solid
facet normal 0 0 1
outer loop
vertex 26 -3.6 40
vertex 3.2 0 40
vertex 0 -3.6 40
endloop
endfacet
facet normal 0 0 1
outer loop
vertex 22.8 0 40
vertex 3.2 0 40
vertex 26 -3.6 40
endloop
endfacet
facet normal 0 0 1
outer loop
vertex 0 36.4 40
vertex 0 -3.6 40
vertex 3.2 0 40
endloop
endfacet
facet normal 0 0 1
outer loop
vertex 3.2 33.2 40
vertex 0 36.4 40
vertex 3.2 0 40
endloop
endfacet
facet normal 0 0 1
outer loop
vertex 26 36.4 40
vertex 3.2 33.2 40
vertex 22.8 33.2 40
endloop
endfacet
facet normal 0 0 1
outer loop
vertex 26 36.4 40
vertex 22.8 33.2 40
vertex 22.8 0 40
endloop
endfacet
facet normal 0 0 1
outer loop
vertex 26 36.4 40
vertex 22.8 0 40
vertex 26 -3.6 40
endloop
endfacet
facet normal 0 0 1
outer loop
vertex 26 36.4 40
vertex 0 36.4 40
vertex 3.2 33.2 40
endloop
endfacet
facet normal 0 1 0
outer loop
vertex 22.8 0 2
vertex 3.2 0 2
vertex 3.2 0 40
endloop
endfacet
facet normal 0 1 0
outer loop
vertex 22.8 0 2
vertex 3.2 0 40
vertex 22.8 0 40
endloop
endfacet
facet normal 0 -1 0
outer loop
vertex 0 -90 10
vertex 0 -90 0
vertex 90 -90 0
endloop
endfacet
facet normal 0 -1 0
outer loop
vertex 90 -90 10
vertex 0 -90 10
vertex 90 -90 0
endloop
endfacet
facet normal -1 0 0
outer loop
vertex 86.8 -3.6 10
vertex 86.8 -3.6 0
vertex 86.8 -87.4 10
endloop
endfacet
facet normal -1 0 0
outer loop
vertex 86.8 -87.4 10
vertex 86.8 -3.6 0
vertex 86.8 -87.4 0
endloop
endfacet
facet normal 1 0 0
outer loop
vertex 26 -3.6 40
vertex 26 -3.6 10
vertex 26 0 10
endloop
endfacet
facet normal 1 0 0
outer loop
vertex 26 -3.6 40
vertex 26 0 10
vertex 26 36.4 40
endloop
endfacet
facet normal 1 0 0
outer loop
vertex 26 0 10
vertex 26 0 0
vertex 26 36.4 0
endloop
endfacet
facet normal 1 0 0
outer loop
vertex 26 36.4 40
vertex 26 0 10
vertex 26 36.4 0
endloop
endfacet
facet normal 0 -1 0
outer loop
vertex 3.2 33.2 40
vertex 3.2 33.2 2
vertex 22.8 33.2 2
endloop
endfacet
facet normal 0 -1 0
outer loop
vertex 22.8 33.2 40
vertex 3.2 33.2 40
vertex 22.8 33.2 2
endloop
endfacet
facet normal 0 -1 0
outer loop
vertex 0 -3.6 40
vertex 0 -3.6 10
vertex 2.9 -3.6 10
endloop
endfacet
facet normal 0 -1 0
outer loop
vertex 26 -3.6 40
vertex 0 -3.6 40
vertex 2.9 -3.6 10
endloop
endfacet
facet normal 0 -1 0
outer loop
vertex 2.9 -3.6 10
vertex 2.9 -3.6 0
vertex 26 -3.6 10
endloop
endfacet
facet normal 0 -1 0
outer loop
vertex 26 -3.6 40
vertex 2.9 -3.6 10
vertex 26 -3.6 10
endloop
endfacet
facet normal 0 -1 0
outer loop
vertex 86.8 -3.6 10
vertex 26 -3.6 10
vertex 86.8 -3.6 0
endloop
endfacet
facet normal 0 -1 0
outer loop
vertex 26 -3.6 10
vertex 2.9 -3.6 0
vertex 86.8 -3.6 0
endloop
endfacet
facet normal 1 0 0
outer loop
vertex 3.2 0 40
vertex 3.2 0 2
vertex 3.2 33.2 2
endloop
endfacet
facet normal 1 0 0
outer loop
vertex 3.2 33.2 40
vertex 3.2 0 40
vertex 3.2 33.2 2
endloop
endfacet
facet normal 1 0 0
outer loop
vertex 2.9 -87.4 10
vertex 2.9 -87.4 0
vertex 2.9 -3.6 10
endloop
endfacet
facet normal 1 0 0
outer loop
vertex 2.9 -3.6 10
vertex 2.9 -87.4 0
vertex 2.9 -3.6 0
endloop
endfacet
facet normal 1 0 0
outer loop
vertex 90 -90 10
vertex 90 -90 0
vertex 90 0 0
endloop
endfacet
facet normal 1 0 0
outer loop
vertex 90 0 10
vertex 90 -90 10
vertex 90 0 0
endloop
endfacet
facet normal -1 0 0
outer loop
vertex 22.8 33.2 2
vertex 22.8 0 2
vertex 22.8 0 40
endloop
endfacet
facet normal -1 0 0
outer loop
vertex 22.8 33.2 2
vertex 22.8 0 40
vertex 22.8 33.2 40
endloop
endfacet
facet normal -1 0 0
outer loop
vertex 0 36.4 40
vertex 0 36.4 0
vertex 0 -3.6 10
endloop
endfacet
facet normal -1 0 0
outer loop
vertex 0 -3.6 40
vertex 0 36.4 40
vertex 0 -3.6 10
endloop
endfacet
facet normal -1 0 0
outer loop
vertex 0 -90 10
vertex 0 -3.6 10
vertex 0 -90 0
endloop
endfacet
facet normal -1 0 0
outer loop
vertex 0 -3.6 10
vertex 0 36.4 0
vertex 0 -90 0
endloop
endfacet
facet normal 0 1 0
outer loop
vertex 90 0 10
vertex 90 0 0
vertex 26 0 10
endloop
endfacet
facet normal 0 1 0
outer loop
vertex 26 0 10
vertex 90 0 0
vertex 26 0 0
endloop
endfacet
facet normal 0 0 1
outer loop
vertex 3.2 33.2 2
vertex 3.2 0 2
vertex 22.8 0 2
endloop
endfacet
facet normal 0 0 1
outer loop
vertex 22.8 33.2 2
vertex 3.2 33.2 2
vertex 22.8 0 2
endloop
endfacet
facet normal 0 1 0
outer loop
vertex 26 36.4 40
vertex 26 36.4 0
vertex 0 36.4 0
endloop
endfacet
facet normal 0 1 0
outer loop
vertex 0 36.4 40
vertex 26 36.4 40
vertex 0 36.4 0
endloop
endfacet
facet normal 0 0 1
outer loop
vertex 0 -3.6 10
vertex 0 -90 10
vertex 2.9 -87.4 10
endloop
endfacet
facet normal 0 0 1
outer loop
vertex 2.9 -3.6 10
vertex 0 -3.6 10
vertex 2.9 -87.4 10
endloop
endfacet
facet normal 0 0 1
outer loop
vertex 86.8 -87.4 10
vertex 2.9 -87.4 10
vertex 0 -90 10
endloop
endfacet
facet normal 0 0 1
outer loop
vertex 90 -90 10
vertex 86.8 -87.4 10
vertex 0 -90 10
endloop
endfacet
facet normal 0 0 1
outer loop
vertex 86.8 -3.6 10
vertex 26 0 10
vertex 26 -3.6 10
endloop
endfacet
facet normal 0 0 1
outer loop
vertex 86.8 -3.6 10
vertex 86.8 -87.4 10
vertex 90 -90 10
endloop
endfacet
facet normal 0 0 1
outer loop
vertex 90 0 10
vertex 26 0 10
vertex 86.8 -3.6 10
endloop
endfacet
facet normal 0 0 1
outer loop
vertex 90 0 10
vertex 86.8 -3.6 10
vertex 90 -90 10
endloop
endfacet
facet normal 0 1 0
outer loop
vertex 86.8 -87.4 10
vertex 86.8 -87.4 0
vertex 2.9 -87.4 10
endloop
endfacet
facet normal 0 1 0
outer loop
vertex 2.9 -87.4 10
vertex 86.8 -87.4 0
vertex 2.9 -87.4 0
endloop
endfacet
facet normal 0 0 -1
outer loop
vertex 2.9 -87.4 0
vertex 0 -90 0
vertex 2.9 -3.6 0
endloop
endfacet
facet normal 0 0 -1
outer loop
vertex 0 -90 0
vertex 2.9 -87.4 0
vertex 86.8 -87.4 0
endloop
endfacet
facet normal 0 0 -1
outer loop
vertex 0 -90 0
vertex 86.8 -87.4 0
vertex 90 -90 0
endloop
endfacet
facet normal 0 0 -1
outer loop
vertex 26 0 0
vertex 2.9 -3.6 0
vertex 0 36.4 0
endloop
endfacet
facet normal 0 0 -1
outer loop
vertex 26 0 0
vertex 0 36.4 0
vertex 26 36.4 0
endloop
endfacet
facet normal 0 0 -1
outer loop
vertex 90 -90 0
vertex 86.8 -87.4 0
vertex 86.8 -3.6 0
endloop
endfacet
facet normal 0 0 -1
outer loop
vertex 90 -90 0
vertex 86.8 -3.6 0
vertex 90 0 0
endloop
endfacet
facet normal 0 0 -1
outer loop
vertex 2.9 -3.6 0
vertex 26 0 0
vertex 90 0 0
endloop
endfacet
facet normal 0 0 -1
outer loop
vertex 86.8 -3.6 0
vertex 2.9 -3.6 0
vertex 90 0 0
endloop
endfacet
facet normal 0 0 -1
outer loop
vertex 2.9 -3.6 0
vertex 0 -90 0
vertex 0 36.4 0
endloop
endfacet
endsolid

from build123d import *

# Parameters (mm, degrees)
F0_W     = 19.6
F0_H     = 33.2
F1_DEPTH = 40
F2_DEPTH = 10
F3_DEPTH = 2


# Not quite as in the source:
# - a feature names something its author has since deleted; it is built from what else it names


with BuildPart() as f1:
    # F0 (on Top) → F1 (new body)
    with BuildSketch(Plane.XY):
        Polygon((0, 0), (0, -3.6), (2.9, -3.6), (26, -3.6), (26, 0), (26, 36.4), (0, 36.4), align=None)
        with Locations((13, 16.6)):
            Rectangle(F0_W, F0_H, mode=Mode.SUBTRACT)
    extrude(amount=F1_DEPTH)

    # F0 (on Top) → F2 (join)
    with BuildSketch(Plane.XY):
        Polygon((86.8, -90), (90, -90), (90, -87.4), (90, 0), (26, 0), (26, -3.6), (86.8, -3.6), (86.8, -87.4), (2.9, -87.4), (2.9, -3.6), (0, -3.6), (0, -90), align=None)
    extrude(amount=F2_DEPTH)

    # F0 (on Top) → F3 (join)
    with BuildSketch(Plane.XY):
        with Locations((13, 16.6)):
            Rectangle(F0_W, F0_H)
    extrude(amount=F3_DEPTH)


solid = f1.part
